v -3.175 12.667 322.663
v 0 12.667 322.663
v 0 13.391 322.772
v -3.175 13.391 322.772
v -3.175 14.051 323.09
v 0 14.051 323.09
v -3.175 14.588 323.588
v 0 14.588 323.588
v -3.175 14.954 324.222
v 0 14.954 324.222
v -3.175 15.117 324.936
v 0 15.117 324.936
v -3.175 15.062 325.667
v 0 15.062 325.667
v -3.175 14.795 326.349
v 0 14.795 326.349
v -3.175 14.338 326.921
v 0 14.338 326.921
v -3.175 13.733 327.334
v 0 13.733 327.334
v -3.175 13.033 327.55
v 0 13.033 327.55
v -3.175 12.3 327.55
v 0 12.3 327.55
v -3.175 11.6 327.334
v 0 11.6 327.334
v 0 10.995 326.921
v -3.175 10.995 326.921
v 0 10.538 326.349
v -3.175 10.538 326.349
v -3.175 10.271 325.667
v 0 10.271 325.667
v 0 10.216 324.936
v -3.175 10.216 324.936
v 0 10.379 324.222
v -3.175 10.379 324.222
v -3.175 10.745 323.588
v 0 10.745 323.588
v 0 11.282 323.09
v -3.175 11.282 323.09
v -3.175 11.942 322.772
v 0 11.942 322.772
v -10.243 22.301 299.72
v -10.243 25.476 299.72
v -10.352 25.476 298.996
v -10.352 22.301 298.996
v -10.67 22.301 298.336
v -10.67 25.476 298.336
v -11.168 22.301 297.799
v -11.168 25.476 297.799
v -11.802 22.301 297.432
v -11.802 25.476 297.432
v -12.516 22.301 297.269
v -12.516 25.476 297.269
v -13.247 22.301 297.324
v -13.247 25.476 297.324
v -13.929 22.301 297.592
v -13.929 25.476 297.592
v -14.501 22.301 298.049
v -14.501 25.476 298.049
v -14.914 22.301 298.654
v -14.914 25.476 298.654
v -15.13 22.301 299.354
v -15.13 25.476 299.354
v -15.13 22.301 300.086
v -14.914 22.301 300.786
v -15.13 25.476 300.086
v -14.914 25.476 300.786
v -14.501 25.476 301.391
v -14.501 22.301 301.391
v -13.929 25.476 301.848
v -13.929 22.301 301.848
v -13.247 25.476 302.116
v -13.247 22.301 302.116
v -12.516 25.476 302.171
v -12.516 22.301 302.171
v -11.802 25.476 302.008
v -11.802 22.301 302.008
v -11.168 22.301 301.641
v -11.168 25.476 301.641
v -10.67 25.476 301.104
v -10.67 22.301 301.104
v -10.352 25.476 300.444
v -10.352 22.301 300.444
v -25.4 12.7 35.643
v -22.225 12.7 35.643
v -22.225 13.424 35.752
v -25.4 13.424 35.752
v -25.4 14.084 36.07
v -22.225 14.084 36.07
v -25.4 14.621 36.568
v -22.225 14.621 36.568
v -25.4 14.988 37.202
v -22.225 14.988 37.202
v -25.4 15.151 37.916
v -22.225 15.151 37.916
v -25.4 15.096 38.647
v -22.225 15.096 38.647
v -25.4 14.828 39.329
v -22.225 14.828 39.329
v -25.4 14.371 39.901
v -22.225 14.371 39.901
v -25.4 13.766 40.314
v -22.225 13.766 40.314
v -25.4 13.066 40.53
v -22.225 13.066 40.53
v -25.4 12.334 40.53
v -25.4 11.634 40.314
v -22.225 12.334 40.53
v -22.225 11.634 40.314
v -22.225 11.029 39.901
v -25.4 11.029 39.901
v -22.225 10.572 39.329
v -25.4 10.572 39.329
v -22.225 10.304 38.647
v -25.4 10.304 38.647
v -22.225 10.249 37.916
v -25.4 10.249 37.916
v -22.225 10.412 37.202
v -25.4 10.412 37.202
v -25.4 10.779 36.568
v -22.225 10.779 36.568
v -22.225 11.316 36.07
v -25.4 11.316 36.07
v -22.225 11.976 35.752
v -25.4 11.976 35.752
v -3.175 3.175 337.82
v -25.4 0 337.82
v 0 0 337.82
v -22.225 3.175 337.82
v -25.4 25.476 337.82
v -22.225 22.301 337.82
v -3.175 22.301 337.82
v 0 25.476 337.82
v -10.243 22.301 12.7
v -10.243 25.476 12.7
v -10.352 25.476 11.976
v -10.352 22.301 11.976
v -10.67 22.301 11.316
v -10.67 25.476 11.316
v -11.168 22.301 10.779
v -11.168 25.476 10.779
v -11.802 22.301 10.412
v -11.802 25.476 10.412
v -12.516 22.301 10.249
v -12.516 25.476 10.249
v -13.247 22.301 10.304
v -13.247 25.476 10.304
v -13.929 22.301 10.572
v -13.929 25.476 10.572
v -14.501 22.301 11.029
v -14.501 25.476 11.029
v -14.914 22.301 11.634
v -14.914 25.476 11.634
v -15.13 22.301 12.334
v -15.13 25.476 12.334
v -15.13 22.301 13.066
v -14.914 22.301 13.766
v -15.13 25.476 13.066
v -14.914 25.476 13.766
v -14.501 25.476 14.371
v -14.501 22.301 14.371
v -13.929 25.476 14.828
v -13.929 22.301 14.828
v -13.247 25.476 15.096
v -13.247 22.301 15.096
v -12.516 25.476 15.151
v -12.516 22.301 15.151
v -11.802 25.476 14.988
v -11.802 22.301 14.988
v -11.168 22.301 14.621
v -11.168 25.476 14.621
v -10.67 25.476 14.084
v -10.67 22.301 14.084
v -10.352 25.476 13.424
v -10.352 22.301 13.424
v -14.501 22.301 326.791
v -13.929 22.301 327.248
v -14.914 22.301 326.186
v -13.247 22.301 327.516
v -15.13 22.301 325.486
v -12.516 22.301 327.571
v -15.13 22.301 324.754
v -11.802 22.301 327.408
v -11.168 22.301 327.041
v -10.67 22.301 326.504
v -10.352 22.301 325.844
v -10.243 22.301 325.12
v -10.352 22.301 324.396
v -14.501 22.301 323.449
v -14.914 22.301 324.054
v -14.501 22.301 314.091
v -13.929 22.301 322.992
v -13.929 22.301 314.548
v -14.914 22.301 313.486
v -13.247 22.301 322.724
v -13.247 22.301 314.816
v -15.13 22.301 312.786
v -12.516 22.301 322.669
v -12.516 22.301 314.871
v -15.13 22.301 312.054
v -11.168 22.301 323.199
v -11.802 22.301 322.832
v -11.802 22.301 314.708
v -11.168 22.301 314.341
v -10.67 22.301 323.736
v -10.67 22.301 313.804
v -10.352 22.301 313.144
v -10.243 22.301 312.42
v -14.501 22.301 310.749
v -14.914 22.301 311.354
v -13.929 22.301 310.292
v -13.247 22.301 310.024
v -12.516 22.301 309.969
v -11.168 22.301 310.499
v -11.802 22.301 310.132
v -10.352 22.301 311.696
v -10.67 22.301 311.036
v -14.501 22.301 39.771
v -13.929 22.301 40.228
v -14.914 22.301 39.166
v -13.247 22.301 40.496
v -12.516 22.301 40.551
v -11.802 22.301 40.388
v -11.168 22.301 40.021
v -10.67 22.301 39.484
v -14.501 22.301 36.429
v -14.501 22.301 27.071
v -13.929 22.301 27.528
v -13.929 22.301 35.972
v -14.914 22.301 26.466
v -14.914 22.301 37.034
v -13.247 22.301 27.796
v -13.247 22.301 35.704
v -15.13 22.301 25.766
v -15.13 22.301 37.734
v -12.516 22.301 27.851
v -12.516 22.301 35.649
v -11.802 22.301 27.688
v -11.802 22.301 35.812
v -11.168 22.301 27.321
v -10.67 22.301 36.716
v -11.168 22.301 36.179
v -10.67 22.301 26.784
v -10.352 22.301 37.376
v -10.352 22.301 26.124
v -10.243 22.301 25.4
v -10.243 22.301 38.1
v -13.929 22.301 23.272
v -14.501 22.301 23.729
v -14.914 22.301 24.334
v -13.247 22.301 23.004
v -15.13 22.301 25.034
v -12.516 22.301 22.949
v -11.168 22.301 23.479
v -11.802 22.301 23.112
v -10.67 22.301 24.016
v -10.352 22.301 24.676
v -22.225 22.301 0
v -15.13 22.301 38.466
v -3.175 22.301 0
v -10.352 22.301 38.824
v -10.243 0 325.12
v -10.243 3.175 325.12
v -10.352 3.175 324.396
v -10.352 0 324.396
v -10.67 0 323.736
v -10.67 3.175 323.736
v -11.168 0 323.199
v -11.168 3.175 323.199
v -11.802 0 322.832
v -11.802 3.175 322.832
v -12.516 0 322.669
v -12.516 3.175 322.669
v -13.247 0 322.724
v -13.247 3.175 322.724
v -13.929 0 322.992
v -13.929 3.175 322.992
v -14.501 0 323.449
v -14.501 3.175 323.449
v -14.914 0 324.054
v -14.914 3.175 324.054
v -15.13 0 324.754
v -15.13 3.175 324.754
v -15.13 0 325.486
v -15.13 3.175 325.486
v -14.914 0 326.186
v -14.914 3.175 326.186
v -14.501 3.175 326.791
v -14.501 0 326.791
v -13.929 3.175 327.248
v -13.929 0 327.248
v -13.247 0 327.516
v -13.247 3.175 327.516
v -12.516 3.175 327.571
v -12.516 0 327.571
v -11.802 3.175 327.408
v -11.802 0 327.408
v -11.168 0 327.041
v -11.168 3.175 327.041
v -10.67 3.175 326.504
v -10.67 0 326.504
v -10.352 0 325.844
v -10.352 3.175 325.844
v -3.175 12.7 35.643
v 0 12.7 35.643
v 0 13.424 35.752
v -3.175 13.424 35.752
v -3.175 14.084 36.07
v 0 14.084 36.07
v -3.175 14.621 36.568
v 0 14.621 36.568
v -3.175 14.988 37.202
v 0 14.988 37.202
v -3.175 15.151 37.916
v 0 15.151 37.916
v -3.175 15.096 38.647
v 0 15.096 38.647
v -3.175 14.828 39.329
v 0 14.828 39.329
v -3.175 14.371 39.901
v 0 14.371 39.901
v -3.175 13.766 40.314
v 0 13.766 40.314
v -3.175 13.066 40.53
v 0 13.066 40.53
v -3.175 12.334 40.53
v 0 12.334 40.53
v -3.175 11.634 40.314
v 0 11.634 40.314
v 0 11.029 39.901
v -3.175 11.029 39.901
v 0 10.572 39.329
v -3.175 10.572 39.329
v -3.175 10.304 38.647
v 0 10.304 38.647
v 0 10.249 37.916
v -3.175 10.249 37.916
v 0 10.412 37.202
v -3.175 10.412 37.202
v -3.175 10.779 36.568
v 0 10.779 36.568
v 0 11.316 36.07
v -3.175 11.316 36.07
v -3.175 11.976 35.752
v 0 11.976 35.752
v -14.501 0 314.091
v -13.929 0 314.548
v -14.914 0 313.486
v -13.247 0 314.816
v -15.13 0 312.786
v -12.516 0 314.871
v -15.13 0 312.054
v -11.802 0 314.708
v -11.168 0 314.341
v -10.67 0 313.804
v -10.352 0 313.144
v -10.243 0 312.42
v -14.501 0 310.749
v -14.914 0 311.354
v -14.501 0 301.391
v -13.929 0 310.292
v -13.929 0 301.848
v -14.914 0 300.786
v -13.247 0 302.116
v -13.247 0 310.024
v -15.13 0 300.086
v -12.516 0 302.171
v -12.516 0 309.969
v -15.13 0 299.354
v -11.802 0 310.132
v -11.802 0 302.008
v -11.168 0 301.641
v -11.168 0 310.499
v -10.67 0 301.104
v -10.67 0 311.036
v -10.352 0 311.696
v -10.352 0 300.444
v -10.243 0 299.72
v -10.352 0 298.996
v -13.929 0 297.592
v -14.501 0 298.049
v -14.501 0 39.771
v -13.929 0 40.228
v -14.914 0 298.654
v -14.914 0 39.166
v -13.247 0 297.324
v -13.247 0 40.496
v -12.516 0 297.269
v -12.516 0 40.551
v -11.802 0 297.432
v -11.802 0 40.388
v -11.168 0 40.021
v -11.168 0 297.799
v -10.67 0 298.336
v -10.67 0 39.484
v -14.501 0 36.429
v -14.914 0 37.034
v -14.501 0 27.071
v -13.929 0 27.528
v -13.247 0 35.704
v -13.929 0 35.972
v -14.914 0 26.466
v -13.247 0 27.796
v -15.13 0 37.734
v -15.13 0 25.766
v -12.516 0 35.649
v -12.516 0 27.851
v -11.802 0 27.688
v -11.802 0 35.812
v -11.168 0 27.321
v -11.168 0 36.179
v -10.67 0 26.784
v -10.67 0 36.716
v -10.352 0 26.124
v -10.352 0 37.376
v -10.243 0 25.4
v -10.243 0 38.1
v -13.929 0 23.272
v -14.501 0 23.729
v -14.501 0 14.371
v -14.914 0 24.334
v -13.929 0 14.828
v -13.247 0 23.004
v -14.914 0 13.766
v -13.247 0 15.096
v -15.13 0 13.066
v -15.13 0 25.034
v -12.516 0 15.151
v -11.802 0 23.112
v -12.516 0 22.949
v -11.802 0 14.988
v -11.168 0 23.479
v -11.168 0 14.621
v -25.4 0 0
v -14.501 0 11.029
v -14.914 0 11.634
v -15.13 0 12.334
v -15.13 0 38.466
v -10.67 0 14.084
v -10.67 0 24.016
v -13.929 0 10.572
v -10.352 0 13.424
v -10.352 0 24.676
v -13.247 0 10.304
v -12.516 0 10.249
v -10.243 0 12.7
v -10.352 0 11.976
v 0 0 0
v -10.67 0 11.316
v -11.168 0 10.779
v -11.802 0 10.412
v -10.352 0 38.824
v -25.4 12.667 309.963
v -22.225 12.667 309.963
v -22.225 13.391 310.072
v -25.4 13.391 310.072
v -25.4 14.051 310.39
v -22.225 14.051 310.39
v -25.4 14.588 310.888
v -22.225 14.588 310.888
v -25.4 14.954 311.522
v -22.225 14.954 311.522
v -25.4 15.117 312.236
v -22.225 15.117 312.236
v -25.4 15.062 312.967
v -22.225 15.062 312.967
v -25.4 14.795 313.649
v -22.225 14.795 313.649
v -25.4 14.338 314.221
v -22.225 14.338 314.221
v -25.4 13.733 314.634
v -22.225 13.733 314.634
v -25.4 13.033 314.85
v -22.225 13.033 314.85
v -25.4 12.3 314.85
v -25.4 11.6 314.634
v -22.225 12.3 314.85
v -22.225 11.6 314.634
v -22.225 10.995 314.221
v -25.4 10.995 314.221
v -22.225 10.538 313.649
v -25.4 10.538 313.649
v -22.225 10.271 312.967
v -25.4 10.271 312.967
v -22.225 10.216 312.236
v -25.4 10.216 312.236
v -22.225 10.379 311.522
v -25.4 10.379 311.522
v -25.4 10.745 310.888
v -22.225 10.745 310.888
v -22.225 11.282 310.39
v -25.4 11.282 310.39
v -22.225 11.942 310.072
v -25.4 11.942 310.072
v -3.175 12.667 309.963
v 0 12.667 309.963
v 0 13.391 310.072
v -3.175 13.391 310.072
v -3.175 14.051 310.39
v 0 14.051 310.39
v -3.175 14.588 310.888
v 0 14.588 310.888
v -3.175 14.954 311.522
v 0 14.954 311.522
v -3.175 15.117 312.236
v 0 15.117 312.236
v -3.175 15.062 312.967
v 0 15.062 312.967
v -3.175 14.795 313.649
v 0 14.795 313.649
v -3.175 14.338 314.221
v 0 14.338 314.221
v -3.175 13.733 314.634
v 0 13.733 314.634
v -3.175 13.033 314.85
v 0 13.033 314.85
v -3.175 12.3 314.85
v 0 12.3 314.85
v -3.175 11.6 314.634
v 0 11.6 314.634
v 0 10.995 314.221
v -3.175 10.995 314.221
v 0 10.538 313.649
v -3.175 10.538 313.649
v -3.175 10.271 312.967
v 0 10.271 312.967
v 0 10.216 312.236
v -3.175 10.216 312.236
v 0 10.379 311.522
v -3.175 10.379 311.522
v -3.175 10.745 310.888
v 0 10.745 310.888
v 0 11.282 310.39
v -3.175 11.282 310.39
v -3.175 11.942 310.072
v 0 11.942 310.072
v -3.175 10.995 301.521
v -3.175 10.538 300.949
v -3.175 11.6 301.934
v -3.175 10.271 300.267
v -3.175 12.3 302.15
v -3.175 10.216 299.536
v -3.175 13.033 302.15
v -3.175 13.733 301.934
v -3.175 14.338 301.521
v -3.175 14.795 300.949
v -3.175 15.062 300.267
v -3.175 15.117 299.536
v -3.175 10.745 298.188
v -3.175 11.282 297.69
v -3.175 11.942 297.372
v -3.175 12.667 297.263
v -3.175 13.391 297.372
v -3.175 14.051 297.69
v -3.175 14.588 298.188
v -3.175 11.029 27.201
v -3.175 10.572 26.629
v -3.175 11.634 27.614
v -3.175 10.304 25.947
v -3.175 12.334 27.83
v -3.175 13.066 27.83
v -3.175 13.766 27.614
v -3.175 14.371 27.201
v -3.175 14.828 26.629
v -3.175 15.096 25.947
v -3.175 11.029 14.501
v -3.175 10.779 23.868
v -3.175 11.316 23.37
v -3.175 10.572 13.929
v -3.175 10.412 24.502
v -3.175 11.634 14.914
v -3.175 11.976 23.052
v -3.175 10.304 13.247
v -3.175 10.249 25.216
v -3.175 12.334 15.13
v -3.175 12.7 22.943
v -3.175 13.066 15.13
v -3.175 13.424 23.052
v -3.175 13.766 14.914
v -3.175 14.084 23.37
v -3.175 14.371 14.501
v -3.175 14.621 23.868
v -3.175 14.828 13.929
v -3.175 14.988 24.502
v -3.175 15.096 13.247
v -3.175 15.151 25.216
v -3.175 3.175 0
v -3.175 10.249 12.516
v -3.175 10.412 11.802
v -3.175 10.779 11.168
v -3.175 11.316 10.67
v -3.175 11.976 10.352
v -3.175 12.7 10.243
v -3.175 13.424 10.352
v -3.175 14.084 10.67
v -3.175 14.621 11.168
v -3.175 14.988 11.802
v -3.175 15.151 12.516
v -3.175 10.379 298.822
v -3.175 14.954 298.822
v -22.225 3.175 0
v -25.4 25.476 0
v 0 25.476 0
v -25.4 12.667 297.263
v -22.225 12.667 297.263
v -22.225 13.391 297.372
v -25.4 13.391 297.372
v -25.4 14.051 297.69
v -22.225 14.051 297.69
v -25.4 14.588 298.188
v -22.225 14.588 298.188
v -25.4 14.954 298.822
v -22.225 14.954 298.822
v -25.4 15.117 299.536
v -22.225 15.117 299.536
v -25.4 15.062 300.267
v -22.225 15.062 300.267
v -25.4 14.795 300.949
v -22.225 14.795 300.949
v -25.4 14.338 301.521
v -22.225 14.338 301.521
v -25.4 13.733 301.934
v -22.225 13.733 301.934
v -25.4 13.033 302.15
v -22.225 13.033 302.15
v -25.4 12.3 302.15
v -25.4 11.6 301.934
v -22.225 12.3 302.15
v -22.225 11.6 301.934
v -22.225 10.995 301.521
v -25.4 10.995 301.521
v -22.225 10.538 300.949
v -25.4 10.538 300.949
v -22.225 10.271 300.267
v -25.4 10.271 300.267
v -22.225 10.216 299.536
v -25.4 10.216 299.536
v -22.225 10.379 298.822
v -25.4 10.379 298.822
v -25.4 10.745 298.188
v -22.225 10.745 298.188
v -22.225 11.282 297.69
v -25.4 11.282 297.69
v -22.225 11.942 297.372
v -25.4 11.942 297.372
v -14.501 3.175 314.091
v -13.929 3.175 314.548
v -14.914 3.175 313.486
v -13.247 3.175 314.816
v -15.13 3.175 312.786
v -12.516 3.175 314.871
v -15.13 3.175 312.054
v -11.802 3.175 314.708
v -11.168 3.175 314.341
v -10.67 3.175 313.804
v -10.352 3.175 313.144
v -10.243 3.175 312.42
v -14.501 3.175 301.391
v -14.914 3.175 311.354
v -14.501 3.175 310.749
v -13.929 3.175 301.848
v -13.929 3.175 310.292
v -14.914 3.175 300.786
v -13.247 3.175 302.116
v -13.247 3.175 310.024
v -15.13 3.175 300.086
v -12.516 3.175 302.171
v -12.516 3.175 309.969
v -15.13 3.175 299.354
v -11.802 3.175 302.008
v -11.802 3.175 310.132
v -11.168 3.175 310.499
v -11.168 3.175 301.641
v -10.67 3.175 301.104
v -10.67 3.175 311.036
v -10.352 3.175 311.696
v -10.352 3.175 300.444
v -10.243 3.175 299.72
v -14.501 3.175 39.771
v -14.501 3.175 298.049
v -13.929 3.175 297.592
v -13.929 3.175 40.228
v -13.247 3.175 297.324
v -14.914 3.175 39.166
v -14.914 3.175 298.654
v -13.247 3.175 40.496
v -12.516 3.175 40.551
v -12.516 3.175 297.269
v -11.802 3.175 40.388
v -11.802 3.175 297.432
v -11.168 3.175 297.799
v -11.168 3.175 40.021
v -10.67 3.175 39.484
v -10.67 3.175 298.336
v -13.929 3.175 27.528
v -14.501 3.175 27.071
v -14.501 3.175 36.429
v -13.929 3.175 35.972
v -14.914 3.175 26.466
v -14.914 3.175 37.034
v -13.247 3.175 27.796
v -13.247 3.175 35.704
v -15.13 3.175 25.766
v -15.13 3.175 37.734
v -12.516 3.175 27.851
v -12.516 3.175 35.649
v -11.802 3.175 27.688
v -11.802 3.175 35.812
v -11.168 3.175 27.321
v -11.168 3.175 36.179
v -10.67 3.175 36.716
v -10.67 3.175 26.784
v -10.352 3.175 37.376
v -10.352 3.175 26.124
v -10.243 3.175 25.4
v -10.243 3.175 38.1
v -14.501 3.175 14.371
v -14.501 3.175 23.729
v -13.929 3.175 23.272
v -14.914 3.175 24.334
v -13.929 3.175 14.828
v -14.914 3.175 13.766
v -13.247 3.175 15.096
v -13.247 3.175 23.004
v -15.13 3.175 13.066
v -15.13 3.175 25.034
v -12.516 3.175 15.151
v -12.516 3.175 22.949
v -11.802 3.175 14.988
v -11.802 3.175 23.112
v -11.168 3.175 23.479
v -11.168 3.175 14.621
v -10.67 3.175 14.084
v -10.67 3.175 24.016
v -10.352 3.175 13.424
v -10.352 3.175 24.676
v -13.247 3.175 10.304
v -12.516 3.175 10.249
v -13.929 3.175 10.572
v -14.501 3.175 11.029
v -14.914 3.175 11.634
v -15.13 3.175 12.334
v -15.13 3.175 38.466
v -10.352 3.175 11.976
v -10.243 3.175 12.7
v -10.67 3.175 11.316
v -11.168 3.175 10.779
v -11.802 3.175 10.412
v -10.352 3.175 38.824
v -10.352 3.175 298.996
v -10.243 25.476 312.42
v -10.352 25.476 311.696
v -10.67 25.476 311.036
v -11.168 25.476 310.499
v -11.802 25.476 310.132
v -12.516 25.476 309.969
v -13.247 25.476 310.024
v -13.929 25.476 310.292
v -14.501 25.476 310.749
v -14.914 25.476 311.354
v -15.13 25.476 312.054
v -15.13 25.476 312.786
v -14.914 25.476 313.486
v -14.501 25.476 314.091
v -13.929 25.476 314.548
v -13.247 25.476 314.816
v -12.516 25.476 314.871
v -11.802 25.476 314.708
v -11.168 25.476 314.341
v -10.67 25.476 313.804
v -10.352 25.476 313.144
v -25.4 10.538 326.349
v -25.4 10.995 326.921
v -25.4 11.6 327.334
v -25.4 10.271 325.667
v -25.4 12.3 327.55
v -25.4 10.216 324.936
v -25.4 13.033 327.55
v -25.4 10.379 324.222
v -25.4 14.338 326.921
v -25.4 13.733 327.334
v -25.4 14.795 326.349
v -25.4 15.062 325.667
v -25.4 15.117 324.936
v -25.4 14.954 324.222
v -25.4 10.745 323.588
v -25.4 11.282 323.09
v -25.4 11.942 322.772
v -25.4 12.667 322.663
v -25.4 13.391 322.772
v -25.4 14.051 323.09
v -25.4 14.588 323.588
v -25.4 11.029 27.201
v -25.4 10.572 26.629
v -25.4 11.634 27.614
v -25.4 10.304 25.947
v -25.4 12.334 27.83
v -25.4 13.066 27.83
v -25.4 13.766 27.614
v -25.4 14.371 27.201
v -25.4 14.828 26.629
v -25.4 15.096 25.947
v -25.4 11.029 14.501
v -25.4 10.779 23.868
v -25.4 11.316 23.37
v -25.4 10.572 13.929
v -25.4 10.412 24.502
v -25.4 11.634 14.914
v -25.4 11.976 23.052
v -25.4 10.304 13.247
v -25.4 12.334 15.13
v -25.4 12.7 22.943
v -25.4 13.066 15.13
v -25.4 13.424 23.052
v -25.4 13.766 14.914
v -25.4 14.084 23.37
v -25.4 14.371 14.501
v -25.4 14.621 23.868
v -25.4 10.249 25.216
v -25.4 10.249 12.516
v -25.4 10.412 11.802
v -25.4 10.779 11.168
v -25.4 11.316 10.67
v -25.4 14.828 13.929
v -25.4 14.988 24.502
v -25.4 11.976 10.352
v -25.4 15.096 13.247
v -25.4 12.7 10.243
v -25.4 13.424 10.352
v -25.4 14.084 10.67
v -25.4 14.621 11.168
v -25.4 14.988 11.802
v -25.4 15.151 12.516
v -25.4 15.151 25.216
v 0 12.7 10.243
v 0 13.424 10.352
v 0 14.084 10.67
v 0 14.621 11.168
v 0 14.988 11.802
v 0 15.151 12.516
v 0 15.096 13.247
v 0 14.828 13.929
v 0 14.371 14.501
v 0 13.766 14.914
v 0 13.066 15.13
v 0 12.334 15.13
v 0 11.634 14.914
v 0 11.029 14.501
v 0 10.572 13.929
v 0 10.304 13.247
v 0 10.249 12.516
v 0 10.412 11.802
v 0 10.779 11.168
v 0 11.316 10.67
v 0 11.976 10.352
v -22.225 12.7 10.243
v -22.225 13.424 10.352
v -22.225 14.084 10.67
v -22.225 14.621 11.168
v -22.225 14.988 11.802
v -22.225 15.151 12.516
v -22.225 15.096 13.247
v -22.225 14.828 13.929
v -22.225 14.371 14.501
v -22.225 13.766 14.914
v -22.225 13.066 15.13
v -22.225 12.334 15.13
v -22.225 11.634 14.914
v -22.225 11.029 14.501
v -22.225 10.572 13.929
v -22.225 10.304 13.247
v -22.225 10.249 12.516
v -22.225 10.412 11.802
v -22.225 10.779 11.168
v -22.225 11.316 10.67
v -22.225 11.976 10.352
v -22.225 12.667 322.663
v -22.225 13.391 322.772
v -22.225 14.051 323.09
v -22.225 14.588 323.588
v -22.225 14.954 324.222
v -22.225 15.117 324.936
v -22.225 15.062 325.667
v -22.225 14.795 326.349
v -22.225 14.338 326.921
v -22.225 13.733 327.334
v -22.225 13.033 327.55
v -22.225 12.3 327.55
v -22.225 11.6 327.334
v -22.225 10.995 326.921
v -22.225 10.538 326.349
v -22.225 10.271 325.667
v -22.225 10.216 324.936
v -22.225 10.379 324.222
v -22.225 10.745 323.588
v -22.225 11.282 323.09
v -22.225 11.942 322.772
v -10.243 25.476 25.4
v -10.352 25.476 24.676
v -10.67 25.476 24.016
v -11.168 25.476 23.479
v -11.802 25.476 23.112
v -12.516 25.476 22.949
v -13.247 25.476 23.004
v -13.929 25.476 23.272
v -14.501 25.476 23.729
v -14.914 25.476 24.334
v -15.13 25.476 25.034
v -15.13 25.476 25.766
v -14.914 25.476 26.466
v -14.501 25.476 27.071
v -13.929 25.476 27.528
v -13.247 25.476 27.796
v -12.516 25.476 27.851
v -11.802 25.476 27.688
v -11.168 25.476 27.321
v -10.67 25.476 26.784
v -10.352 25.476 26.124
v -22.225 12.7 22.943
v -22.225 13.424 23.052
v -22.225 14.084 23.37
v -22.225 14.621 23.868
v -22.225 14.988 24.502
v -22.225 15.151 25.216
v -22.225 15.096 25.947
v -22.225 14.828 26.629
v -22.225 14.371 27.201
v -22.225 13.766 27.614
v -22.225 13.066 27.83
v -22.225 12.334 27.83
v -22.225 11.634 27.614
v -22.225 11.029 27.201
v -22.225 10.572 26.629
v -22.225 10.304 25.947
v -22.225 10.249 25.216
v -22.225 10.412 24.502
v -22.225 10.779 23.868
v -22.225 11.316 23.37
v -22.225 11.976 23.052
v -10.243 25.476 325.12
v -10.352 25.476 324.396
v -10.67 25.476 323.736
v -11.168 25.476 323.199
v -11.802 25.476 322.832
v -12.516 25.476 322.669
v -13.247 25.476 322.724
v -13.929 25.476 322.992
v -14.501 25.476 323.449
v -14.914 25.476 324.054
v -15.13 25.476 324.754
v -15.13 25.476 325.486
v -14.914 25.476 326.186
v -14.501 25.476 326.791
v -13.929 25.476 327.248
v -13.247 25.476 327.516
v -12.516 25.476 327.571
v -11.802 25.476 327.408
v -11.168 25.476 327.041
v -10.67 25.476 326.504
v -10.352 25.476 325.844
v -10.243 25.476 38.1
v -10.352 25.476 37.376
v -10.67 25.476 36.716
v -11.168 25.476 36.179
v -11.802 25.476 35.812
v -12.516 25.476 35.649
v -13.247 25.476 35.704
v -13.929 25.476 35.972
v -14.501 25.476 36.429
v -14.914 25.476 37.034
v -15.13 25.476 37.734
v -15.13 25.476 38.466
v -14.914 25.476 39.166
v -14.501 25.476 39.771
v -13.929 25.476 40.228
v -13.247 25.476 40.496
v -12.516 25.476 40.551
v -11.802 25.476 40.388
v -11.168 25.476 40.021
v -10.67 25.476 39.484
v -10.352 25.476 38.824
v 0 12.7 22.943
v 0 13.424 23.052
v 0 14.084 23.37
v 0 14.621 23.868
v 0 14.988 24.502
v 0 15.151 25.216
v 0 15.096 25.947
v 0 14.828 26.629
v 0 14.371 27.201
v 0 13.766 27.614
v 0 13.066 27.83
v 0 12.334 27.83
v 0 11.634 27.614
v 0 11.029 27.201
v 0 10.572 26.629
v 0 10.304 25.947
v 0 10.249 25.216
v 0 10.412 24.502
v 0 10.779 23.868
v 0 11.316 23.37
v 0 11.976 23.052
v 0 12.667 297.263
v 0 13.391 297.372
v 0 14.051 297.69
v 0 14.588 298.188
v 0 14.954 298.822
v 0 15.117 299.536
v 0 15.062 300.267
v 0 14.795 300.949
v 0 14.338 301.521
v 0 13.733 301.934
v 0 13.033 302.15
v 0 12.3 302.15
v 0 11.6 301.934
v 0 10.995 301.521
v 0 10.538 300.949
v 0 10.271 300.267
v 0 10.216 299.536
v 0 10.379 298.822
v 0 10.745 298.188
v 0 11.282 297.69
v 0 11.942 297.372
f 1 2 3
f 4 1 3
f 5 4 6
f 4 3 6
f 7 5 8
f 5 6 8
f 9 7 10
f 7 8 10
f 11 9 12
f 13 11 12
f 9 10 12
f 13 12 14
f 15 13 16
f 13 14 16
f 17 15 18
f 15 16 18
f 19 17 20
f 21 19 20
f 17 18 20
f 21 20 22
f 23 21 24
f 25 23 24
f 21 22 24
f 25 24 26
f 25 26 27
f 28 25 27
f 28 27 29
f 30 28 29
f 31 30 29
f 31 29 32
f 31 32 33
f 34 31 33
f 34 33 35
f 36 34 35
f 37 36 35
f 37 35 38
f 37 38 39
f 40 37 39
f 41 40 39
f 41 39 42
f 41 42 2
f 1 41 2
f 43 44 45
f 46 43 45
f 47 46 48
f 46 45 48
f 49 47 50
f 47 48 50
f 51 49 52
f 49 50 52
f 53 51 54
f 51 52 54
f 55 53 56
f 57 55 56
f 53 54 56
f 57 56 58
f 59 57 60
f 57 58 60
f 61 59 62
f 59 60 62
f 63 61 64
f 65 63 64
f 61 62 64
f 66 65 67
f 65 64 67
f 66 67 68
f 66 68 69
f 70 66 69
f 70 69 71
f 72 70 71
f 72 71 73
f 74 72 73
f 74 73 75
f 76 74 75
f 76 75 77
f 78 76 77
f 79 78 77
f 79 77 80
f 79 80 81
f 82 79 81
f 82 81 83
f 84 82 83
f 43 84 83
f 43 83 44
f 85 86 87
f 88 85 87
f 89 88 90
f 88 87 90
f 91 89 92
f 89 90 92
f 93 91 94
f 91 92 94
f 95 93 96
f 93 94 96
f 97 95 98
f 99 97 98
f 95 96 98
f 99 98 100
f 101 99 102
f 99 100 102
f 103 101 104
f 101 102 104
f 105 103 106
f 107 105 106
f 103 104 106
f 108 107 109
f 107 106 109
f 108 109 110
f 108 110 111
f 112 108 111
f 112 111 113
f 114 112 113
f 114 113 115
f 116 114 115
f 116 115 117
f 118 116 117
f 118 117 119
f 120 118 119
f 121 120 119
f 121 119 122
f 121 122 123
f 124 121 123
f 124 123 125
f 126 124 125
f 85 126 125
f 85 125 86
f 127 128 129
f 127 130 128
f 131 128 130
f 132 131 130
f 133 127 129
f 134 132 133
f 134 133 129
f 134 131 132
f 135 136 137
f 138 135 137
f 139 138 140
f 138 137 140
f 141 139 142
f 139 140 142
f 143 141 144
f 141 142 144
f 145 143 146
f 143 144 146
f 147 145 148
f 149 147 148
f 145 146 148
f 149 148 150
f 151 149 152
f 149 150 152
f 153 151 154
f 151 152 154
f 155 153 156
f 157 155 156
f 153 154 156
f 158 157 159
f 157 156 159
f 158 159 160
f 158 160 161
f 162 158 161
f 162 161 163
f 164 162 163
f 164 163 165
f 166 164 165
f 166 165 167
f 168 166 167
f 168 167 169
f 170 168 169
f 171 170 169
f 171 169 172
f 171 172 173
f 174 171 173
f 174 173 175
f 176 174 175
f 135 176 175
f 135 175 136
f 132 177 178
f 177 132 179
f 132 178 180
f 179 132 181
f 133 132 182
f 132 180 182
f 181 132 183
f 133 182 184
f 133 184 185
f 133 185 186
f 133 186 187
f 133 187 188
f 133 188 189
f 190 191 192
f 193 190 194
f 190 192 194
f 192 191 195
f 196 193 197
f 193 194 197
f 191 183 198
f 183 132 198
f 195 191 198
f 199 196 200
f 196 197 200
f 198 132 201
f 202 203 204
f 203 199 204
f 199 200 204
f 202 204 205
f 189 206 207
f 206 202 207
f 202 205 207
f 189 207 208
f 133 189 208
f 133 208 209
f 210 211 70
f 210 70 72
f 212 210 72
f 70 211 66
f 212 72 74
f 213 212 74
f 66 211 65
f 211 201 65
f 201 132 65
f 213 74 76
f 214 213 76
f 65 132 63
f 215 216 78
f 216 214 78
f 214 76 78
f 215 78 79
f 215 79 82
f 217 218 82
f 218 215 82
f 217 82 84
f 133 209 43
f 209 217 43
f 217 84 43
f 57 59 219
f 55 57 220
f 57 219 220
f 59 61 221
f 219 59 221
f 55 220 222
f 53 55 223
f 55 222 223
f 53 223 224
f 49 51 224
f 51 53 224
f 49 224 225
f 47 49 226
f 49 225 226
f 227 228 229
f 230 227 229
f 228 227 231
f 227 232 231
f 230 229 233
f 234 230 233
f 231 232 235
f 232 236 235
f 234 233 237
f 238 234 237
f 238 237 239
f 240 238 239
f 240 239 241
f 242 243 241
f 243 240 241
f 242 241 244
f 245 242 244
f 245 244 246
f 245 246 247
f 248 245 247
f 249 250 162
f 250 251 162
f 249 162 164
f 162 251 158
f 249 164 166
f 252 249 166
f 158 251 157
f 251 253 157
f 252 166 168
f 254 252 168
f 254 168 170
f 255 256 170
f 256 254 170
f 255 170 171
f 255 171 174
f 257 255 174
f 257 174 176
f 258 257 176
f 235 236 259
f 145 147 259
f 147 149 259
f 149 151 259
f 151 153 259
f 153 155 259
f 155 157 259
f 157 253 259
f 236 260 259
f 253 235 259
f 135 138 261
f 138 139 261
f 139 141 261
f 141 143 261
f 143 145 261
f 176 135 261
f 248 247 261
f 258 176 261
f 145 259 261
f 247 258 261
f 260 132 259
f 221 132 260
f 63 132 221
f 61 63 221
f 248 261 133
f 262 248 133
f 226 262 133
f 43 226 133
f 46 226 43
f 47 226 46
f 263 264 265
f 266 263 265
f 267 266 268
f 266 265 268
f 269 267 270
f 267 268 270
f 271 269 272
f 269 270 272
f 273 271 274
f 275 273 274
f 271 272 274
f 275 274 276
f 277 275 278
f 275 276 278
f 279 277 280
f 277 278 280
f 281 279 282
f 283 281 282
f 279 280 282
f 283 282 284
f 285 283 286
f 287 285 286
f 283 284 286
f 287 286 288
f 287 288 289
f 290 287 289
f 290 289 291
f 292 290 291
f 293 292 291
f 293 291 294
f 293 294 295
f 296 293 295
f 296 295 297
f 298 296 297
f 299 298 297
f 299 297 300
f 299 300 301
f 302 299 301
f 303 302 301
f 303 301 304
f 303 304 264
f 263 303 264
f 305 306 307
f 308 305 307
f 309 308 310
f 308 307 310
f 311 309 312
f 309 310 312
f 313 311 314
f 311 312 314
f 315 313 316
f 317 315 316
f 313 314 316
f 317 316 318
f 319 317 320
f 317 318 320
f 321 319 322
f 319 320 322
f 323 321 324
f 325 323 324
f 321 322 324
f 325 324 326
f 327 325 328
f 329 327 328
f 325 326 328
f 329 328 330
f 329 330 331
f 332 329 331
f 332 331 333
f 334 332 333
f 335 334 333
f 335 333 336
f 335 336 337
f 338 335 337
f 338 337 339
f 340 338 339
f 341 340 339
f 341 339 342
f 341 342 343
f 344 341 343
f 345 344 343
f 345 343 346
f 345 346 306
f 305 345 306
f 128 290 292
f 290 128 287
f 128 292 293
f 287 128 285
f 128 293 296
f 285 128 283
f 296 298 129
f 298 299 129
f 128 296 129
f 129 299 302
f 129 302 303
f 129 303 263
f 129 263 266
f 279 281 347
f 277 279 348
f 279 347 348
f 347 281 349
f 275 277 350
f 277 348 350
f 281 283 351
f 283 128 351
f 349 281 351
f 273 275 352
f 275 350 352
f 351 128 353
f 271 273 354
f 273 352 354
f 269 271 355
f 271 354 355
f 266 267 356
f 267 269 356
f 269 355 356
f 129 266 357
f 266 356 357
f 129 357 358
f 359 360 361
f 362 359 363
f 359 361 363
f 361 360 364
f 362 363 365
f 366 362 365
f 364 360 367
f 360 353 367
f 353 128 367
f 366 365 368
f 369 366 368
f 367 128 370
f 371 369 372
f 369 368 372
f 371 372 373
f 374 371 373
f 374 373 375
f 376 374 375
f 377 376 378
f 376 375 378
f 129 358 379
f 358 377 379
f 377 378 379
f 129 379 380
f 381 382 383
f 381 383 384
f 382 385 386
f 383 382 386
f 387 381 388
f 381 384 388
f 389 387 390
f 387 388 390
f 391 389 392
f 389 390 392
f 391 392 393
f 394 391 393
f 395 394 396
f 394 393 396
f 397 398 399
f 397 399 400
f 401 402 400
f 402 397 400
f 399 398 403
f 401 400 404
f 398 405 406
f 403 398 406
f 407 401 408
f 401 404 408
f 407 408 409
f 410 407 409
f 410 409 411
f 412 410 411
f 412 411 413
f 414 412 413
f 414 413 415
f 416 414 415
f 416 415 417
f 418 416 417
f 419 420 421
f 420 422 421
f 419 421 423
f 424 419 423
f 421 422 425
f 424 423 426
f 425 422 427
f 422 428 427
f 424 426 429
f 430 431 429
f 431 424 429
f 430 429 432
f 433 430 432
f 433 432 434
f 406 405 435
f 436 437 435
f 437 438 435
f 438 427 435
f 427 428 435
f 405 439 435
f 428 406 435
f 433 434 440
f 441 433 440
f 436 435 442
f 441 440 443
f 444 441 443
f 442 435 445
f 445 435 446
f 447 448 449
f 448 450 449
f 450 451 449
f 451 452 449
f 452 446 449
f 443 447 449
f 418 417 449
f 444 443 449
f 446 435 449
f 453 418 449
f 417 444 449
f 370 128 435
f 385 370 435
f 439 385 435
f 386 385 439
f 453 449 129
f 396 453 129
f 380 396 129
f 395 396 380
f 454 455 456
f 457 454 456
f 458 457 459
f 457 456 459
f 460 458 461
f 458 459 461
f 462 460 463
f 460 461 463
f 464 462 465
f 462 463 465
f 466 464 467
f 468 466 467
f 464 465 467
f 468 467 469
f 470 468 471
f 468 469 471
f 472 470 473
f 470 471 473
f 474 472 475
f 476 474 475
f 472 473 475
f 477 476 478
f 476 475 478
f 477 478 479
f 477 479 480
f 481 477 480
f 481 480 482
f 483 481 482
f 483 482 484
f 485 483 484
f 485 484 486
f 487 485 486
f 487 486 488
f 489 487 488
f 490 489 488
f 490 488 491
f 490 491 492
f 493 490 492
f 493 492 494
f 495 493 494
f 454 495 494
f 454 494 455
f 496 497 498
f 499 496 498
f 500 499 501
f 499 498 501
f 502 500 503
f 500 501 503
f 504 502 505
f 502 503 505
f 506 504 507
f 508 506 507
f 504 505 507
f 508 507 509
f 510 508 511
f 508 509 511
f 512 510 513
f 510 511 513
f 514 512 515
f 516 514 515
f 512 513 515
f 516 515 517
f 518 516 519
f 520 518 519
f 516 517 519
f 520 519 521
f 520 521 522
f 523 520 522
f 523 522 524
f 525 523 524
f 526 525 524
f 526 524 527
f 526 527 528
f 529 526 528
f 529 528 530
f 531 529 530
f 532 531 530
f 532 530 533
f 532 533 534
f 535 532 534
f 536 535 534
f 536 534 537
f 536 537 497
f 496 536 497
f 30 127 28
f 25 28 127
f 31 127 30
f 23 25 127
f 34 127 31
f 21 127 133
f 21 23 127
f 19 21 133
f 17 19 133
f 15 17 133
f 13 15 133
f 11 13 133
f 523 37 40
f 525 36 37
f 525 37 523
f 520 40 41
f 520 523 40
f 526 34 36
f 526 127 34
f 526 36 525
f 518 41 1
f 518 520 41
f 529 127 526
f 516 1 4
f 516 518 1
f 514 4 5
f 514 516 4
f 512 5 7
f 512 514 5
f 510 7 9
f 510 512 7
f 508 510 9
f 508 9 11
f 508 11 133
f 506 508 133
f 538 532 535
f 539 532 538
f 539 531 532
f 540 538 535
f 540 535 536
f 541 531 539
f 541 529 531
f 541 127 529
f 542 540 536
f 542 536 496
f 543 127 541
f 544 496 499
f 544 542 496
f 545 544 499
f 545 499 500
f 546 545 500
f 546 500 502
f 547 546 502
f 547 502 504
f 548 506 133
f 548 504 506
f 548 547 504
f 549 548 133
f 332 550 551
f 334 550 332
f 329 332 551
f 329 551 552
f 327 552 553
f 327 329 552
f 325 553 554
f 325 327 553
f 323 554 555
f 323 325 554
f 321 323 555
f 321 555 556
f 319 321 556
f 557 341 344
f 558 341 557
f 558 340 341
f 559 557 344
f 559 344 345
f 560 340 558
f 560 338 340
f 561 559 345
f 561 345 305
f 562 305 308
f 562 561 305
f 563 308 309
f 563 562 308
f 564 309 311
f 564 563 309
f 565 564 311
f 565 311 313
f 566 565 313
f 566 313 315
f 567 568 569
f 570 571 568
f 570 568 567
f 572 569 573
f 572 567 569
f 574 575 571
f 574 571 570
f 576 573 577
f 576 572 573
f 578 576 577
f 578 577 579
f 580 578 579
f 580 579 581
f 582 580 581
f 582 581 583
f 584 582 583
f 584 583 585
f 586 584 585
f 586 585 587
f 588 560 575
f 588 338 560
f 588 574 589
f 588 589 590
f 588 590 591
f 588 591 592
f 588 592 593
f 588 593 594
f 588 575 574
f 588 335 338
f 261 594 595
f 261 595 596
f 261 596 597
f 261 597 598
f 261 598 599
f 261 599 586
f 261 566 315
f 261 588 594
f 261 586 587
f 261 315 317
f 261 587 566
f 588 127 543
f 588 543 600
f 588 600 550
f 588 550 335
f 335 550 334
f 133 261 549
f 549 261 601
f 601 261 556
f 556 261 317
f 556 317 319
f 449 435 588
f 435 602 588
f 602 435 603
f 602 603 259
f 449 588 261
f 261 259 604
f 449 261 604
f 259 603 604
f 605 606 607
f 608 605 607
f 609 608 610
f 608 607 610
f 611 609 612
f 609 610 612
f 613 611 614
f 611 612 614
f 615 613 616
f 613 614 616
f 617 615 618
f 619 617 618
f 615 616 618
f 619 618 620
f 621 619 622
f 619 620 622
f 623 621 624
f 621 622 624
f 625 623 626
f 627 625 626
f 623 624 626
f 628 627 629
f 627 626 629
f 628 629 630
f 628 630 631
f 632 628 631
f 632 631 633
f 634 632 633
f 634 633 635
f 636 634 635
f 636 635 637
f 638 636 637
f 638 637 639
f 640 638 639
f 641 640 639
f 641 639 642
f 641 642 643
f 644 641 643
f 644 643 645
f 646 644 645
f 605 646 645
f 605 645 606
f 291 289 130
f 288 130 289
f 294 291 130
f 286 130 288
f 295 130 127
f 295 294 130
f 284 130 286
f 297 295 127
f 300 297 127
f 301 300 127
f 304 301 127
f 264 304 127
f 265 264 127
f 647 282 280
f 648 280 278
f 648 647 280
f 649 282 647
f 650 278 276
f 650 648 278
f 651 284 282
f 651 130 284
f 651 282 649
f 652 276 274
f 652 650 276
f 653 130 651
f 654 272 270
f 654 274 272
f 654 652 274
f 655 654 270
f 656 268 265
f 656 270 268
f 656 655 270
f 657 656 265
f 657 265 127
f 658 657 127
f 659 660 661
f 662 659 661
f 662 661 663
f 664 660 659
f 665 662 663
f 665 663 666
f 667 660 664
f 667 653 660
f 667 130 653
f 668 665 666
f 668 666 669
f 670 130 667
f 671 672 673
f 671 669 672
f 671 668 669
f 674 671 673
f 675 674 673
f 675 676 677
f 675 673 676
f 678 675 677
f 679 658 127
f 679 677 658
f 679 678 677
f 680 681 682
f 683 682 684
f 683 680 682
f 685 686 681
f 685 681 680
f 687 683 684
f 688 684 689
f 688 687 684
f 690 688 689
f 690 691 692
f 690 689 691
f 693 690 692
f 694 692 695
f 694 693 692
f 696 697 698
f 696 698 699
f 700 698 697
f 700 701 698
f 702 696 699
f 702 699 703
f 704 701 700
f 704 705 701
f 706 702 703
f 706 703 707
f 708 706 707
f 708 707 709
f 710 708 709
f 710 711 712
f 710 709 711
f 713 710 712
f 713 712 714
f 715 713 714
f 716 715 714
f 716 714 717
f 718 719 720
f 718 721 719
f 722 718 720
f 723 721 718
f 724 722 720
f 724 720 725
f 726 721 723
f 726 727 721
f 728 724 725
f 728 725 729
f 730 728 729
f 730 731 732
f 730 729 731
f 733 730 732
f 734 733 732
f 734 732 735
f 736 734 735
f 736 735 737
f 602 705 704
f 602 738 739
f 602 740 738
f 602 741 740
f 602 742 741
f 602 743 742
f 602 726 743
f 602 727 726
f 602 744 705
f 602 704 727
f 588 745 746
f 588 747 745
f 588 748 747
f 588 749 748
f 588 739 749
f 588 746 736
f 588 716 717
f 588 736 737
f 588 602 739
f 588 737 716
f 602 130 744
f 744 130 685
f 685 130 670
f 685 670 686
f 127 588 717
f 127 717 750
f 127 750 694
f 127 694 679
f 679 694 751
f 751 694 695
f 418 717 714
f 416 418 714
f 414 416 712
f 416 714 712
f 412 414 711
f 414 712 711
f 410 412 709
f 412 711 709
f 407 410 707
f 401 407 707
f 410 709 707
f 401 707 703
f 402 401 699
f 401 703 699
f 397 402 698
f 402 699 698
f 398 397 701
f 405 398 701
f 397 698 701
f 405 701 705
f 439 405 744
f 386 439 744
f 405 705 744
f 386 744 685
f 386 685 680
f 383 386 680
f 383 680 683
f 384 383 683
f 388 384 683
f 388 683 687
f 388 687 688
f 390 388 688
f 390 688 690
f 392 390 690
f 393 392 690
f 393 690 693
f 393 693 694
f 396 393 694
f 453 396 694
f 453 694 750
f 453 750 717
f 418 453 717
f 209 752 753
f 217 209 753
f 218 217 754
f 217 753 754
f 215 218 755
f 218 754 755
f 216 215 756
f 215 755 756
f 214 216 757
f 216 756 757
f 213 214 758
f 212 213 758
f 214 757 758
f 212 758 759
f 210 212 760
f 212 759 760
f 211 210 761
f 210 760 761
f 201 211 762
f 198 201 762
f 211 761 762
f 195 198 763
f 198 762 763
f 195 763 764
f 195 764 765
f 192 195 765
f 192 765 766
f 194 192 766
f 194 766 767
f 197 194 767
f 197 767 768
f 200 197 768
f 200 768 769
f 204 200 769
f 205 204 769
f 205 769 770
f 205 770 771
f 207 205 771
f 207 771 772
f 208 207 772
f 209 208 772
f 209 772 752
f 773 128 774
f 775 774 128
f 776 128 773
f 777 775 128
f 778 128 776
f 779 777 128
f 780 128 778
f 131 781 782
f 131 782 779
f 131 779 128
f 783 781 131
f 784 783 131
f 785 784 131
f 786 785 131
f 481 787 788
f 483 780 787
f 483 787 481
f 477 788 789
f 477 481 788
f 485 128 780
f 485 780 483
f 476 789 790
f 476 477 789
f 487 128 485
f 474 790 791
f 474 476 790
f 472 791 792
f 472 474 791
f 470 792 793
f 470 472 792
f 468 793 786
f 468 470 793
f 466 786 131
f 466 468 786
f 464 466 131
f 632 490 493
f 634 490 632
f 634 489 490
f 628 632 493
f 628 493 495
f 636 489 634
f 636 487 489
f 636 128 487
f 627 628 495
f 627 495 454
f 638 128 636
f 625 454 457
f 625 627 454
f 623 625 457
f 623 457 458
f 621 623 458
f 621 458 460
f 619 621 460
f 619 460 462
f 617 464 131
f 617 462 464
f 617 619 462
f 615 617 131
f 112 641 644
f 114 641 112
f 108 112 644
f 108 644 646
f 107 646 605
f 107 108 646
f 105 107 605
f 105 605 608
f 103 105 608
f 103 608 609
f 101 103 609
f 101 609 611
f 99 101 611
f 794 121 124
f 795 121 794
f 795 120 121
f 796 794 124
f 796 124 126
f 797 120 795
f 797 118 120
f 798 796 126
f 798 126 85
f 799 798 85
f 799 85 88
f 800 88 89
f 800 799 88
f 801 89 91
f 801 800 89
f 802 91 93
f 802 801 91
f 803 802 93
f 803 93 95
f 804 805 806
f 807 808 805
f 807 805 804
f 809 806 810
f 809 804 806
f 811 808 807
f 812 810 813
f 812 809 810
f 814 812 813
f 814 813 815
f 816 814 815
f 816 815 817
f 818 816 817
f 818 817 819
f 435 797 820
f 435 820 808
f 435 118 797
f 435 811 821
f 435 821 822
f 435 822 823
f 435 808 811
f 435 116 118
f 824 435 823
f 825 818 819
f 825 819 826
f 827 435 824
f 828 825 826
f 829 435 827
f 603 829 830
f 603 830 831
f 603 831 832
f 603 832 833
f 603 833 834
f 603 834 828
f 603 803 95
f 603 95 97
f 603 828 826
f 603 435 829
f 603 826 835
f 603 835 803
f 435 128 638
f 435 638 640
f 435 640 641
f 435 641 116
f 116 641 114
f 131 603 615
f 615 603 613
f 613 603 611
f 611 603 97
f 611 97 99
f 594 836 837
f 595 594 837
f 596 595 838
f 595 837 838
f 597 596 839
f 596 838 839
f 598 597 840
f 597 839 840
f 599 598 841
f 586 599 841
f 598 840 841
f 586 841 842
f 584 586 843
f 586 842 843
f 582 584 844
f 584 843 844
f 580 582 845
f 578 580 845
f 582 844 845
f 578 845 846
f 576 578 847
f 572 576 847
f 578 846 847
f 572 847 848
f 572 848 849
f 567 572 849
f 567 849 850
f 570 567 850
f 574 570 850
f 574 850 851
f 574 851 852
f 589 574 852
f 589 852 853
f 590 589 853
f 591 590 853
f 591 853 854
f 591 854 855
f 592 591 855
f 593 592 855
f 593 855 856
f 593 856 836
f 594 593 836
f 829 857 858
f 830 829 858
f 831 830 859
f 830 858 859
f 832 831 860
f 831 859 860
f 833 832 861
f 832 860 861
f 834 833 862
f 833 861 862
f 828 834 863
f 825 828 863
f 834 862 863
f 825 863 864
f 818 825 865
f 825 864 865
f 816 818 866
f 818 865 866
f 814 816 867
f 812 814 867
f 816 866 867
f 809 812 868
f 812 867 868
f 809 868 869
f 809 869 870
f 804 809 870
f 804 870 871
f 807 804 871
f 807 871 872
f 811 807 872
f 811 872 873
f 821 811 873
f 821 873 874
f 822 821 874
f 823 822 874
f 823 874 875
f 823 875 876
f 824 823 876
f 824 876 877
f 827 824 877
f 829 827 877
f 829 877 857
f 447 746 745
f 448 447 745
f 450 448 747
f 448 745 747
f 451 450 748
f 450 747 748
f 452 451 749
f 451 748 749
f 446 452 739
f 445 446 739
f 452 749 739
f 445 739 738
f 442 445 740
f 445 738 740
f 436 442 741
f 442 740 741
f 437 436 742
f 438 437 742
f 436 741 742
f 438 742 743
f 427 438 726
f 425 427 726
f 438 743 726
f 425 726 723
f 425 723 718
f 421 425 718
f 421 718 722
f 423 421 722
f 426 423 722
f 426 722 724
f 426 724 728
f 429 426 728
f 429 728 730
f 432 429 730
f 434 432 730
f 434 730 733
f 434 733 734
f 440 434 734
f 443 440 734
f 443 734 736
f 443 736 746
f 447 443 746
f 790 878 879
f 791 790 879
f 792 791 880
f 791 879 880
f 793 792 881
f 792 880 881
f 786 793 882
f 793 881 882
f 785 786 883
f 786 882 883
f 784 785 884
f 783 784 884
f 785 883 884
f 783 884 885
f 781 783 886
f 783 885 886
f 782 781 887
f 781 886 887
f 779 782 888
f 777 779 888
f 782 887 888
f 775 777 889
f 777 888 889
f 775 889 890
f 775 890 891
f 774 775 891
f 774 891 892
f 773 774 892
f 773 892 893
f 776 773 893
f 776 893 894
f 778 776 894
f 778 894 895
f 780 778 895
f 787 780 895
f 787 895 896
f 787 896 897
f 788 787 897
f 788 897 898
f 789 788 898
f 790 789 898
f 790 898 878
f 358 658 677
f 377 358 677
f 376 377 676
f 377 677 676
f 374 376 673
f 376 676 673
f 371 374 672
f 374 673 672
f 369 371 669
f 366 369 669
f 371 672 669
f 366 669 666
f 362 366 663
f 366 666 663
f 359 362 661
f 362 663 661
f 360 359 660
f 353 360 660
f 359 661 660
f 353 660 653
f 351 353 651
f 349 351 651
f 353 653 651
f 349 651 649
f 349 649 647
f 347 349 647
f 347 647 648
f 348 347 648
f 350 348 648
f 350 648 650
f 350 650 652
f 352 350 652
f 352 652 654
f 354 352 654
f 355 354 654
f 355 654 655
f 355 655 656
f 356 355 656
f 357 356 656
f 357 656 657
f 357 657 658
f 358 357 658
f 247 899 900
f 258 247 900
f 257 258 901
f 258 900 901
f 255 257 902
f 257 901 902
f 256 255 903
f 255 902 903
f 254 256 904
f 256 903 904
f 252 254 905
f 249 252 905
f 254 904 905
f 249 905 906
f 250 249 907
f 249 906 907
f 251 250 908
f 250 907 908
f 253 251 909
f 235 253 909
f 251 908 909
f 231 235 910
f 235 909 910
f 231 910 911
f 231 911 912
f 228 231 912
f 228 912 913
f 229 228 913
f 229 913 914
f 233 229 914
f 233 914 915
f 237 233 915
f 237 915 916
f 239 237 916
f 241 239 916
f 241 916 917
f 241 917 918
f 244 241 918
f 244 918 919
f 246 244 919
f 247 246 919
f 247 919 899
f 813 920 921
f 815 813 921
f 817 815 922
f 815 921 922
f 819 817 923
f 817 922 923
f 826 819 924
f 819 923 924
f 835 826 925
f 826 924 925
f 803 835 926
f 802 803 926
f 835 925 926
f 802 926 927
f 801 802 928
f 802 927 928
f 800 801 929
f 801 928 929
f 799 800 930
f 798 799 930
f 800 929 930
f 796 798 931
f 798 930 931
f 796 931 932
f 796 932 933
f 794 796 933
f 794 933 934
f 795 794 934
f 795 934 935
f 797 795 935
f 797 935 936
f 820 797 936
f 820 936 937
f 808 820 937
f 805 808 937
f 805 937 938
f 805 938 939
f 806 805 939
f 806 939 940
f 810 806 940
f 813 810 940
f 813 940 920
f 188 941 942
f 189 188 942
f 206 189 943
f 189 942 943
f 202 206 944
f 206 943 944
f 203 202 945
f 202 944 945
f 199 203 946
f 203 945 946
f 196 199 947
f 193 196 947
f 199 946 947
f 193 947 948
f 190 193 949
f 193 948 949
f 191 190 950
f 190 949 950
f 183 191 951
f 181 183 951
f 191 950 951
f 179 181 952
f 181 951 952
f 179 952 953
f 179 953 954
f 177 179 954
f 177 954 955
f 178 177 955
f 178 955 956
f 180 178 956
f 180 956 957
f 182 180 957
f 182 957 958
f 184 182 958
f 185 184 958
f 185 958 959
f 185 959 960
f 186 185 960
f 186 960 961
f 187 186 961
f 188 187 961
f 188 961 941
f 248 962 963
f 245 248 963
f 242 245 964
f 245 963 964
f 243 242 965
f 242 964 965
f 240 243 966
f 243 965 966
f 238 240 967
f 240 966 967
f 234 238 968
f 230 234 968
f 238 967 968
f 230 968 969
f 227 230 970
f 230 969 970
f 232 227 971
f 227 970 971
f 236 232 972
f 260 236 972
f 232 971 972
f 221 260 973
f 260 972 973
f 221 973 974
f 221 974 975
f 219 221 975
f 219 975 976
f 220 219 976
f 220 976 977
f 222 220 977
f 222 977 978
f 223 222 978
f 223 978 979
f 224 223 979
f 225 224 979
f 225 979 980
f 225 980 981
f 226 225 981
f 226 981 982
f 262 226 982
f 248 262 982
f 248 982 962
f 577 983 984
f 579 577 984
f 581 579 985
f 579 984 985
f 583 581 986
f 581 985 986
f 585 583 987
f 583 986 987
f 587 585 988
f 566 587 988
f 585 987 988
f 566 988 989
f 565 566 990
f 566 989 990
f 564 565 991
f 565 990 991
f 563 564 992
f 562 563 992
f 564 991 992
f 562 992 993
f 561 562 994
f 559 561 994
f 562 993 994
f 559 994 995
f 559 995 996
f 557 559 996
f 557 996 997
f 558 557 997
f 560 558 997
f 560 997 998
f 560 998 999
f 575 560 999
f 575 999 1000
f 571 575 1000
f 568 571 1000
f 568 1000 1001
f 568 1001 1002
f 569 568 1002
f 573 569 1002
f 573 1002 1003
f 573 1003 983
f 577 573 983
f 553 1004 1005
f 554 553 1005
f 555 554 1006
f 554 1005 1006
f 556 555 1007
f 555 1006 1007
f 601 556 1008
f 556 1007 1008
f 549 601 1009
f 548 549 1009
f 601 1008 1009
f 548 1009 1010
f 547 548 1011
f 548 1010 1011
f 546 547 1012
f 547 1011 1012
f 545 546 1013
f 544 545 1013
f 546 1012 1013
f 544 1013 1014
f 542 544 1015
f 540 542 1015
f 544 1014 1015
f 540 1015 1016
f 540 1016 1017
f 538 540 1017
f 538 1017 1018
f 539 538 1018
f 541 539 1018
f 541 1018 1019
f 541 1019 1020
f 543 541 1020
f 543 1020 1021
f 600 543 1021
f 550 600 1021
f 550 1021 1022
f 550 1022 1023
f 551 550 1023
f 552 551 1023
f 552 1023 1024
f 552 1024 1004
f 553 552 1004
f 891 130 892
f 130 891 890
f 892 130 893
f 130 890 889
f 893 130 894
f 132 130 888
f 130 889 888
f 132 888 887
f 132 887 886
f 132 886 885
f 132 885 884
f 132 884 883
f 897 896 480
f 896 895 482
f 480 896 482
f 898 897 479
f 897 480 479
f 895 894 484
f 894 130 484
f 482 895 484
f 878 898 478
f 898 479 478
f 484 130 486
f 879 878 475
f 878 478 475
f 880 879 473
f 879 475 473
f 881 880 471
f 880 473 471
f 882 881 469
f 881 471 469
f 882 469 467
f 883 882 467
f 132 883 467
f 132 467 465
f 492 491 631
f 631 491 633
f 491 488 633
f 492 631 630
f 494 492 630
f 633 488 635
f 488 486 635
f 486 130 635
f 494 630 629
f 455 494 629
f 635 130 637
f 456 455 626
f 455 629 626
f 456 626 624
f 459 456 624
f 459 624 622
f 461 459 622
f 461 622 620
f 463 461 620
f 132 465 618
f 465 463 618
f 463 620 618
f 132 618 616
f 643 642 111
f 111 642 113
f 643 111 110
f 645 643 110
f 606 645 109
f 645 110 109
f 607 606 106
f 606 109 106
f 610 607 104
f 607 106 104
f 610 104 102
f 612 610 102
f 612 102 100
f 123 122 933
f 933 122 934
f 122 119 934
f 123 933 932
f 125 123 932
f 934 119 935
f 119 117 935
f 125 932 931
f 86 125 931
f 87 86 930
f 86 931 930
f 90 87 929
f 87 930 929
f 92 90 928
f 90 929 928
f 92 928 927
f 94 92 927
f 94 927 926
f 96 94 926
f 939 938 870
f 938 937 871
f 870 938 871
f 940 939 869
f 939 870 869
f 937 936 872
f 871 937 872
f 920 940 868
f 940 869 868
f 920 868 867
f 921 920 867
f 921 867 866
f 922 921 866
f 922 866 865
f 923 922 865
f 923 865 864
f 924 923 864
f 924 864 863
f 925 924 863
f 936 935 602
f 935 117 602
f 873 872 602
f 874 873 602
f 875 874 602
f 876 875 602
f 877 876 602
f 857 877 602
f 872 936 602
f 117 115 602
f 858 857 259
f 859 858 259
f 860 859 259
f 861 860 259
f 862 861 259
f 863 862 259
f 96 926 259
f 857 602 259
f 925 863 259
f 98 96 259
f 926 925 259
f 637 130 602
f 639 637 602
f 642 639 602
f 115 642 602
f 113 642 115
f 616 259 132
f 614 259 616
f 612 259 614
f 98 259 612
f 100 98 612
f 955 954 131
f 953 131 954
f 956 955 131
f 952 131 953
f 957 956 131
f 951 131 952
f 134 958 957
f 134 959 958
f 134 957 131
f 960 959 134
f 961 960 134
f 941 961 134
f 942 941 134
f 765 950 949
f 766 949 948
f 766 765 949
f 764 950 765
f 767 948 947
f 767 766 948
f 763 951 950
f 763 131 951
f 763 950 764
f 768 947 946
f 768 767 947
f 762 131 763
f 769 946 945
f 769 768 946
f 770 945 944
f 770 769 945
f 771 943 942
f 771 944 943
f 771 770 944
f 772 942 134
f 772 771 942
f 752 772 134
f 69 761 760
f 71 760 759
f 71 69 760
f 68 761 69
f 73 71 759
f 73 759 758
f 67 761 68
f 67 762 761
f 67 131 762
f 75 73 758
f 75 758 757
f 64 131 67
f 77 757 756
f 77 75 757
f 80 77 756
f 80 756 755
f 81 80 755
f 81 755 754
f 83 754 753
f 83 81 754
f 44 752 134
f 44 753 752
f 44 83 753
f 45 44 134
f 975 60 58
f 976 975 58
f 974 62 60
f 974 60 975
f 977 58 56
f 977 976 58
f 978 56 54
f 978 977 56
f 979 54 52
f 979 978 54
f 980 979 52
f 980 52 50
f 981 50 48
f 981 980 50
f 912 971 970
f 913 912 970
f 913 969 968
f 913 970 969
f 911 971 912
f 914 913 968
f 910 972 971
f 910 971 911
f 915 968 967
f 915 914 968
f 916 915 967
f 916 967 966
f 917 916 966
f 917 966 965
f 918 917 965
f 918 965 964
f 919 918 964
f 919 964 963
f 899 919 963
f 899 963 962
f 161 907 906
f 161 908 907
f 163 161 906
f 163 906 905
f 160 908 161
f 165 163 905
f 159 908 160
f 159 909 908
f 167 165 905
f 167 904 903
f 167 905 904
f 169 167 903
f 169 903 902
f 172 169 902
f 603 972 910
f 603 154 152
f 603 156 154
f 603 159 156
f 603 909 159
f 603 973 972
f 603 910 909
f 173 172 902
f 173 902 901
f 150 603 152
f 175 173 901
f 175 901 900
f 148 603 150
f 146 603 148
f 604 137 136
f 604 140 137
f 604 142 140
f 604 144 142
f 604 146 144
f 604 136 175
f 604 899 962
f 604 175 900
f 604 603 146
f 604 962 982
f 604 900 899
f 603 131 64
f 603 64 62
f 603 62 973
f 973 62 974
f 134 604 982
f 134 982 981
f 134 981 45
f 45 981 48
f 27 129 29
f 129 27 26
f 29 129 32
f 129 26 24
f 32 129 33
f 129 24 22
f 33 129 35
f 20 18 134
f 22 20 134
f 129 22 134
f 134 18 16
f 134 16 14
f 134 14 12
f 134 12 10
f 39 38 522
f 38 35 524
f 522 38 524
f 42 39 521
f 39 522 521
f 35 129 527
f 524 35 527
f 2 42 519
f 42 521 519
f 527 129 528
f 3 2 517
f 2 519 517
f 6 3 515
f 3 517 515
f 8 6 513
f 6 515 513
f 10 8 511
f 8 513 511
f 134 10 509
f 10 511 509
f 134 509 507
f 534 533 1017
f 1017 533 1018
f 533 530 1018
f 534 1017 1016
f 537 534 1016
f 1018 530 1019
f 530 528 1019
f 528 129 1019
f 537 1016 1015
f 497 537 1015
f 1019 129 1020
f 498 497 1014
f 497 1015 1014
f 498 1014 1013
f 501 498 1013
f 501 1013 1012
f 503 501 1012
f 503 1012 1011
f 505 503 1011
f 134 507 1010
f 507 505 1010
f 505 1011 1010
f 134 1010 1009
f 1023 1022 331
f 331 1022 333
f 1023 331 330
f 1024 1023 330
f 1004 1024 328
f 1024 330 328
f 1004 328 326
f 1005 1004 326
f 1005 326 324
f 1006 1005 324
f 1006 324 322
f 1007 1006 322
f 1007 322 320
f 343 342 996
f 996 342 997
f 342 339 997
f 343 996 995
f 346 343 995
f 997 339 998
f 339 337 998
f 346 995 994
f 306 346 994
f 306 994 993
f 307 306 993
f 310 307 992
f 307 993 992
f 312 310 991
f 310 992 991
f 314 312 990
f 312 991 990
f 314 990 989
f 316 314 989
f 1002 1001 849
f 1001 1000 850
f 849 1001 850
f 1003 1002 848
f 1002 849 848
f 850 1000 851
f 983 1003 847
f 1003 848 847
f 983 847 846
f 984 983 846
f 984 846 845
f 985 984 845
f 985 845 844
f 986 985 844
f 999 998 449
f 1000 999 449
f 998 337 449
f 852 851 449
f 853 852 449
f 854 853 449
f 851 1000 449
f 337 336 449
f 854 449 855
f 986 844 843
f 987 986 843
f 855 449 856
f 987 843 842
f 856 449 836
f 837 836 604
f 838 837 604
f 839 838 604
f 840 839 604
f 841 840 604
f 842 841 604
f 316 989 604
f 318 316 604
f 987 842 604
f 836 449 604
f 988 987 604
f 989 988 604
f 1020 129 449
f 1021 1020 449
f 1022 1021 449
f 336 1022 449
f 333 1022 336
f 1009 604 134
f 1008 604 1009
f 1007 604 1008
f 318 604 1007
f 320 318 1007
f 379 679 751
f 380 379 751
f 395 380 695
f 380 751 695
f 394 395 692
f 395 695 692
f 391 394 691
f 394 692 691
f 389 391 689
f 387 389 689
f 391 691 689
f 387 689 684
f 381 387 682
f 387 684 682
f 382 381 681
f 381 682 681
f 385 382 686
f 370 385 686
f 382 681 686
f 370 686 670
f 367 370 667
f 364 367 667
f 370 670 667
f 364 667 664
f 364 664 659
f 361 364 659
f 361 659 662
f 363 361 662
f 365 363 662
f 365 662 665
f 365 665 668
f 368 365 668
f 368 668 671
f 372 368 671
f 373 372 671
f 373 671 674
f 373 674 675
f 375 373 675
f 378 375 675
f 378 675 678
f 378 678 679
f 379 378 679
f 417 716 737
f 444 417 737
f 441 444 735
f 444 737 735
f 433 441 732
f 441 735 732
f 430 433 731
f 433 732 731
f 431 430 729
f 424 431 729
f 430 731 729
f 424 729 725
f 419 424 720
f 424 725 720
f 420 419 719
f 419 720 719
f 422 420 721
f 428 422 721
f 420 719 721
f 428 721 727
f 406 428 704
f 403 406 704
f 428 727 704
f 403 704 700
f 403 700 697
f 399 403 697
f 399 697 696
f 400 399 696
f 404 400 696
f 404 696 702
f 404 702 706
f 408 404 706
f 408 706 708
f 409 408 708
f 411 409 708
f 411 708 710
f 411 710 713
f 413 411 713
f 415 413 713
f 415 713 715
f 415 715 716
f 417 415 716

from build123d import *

# Parameters (mm, degrees)
SKETCH1_W                    = 25.4
SKETCH1_H                    = 25.475595238
SKETCH1_W_2                  = 19.05
SKETCH1_H_2                  = 19.125595238
EXTRUDE_THIN1_DEPTH          = 337.82
F_10_0_1935_DIAMETER_HOLE1_D = 4.9149
F_10_0_1935_DIAMETER_HOLE2_D = 4.9149


with BuildPart() as part:
    # Sketch1 → Extrude-Thin1 (new body)
    with BuildSketch(Plane.XY):
        with Locations((-12.7, 12.737797619)):
            Rectangle(SKETCH1_W, SKETCH1_H)
        with Locations((-12.7, 12.737797619)):
            Rectangle(SKETCH1_W_2, SKETCH1_H_2, mode=Mode.SUBTRACT)
    extrude(amount=EXTRUDE_THIN1_DEPTH)

    # #10 (0.1935) Diameter Hole1 (through all)
    with Locations(Plane(origin=(0, 0, 0), x_dir=(-1, 0, 0), z_dir=(0, -1, 0))):
        with Locations((12.7, -25.4), (12.7, -12.7), (12.7, -38.1), (12.7, -299.72), (12.7, -312.42), (12.7, -325.12)):
            Hole(F_10_0_1935_DIAMETER_HOLE1_D / 2)

    # #10 (0.1935) Diameter Hole2 (through all)
    with Locations(Plane.ZY.offset(25.4)):
        with Locations((325.12, 12.666654514), (312.42, 12.666654514), (299.72, 12.666654514), (38.1, 12.7), (25.4, 12.7), (12.7, 12.7)):
            Hole(F_10_0_1935_DIAMETER_HOLE2_D / 2)


solid = part.part
